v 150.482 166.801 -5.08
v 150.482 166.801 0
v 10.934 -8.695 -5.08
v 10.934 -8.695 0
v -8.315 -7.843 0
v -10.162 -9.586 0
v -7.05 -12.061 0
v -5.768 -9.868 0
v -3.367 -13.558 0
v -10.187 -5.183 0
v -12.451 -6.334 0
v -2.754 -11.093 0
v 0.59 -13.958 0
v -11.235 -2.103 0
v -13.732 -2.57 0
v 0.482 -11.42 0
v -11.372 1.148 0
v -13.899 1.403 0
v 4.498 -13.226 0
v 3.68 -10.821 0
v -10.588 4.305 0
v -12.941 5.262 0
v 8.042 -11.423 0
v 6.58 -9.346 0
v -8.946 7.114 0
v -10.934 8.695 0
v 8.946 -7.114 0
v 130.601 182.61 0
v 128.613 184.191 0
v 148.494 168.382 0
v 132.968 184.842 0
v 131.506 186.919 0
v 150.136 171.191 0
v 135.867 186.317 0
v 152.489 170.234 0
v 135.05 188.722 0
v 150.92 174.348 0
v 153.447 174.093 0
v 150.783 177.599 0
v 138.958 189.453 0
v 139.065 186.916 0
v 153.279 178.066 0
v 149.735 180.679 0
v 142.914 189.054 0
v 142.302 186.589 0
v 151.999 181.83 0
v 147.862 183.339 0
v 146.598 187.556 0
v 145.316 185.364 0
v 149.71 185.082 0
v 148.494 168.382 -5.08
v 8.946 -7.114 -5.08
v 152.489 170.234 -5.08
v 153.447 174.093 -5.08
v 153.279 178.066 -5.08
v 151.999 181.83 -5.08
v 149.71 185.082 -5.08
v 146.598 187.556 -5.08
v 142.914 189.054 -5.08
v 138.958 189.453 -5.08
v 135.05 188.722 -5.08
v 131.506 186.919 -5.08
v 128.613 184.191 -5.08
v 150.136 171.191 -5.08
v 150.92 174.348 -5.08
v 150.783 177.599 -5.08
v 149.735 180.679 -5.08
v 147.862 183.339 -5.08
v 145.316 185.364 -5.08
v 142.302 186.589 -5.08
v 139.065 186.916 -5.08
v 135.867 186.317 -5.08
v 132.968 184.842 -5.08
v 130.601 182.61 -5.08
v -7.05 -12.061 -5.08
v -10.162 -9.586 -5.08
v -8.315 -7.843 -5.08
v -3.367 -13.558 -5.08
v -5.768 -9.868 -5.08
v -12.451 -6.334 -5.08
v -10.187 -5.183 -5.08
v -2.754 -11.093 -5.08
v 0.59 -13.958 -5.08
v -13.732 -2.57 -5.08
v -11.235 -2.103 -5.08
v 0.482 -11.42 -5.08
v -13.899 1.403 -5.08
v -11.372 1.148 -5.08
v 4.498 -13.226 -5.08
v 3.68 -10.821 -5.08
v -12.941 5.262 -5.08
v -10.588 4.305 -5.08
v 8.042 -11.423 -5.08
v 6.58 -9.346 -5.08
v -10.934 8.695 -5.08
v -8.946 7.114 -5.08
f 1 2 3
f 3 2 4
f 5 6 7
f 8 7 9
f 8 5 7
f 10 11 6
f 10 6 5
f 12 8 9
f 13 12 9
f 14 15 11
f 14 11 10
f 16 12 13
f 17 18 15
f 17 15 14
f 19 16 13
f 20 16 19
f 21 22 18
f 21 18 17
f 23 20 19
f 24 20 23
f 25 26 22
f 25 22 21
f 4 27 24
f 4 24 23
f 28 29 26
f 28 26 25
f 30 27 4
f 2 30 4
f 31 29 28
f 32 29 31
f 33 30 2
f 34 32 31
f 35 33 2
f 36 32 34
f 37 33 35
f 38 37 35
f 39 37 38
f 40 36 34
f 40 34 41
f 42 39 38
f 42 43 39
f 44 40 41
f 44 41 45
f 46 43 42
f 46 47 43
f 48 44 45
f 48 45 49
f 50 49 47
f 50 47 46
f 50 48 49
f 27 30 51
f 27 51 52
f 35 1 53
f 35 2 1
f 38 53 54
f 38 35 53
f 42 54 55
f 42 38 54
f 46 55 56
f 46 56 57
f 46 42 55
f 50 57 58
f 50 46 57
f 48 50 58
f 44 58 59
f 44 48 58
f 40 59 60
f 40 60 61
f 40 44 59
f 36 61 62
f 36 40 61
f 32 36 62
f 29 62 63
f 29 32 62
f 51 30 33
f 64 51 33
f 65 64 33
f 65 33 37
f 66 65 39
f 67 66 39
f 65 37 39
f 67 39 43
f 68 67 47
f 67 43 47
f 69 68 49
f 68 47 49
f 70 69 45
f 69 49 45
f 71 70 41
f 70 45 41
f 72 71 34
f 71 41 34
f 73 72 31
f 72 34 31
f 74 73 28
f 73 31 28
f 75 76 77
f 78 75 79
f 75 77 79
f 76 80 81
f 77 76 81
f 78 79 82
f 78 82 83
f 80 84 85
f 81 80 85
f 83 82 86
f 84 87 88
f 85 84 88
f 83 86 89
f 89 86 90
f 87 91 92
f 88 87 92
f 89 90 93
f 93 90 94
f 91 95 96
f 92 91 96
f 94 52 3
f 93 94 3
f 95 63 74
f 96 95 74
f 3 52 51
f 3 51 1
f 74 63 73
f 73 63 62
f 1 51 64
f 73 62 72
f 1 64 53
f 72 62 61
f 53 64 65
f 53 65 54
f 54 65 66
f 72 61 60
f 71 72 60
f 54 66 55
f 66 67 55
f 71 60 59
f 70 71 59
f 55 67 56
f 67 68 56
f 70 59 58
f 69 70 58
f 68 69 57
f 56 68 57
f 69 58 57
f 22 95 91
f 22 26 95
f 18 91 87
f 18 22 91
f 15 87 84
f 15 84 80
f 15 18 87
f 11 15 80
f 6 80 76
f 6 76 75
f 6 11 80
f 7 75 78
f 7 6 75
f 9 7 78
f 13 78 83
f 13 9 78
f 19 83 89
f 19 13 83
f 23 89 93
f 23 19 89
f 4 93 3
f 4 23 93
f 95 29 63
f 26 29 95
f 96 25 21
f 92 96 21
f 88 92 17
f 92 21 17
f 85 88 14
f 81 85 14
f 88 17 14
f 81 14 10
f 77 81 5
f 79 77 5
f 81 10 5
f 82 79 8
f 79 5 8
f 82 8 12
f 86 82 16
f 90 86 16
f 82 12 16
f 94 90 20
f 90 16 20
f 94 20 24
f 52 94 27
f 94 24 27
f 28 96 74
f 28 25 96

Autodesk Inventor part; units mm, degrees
ref_plane "YZ Plane" through (0, 0, 0) normal (1, 0, 0) x (0, 1, 0)
ref_plane "XZ Plane" through (0, 0, 0) normal (0, 1, 0) x (-1, 0, 0)
ref_plane "XY Plane" through (0, 0, 0) normal (0, 0, 1) x (1, 0, 0)
sketch "Sketch1" plane through (0, 0, 0) normal (0, 0, 1) x (1, 0, 0)
  arc A0 (-8.9464, 7.1138) -> (8.9464, -7.1138) centre (0, 0) ccw
  arc A1 (148.494, 168.382) -> (130.6012, 182.6097) centre (139.5476, 175.4959) ccw
  line L0 (-8.9464, 7.1138) -> (130.6012, 182.6097)
  line L1 (148.494, 168.382) -> (8.9464, -7.1138)
  arc A2 (-10.9345, 8.6947) -> (10.9345, -8.6947) centre (0, 0) ccw
  arc A3 (150.4821, 166.8012) -> (128.6131, 184.1906) centre (139.5476, 175.4959) ccw
  line L2 (128.6131, 184.1906) -> (-10.9345, 8.6947)
  line L3 (150.4821, 166.8012) -> (10.9345, -8.6947)
  dimension "d0" = 22.86
  dimension "d1" = 22.86
  dimension "d3" = 27.94
  dimension "d4" = 27.94
extrude "Extrusion1" add sketch "Sketch1" against normal blind 5.08
properties part number "Lift down banding"
